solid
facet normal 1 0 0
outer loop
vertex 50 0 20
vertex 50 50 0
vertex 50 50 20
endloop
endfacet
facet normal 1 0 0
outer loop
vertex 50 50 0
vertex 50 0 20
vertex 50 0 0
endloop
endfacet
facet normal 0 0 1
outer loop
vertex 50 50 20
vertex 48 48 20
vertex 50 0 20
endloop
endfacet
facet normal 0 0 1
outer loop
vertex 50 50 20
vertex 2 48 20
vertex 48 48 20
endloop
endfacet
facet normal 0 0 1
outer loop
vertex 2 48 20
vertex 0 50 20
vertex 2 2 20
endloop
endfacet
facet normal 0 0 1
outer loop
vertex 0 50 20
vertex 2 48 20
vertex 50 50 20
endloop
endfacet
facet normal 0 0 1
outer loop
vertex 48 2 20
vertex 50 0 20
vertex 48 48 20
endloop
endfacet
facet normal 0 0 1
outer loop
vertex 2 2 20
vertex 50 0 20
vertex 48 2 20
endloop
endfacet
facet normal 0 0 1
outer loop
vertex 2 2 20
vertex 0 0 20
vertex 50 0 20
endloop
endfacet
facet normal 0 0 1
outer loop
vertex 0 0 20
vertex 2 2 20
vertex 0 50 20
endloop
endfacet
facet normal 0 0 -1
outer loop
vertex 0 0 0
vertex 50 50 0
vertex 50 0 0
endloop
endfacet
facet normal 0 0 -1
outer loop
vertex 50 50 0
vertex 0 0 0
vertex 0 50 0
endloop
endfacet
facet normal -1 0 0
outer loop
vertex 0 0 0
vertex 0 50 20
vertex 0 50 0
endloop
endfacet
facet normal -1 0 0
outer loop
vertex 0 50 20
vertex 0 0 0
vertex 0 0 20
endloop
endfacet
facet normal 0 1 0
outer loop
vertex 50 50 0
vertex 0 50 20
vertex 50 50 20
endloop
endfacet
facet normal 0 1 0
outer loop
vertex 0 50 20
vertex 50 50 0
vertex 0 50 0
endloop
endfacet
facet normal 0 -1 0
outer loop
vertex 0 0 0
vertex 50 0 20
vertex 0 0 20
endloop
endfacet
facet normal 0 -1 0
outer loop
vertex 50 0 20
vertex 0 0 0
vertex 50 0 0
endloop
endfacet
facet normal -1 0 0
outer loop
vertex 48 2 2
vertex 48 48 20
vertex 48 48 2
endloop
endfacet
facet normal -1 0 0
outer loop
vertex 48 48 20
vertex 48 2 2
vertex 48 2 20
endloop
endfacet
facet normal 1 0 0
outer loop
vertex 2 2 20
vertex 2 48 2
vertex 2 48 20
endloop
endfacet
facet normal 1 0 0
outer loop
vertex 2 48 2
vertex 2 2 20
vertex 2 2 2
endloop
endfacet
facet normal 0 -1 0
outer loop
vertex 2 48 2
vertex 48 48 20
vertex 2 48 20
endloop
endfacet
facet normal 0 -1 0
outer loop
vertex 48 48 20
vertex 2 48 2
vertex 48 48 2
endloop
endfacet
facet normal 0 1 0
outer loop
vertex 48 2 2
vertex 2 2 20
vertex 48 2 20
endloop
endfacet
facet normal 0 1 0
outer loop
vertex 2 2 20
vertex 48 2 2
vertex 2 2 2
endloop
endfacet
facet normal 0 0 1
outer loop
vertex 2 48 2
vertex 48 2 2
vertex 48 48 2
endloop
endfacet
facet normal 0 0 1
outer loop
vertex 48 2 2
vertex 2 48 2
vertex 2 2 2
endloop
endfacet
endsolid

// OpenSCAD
// Test: Box with BOX_NO_LID_B explicitly set
include <../boardgame_insert_toolkit_lib.4.scad>;

g_b_print_lid = true;
g_b_print_box = true;
g_isolated_print_box = "";

data = [
    [ "no lid box",
        [
            [ BOX_SIZE_XYZ, [50, 50, 20] ],
            [ BOX_NO_LID_B, t ],
            [ BOX_FEATURE,
                [
                    [ FTR_COMPARTMENT_SIZE_XYZ, [46, 46, 18] ],
                ]
            ]
        ]
    ],
];

MakeAll();
